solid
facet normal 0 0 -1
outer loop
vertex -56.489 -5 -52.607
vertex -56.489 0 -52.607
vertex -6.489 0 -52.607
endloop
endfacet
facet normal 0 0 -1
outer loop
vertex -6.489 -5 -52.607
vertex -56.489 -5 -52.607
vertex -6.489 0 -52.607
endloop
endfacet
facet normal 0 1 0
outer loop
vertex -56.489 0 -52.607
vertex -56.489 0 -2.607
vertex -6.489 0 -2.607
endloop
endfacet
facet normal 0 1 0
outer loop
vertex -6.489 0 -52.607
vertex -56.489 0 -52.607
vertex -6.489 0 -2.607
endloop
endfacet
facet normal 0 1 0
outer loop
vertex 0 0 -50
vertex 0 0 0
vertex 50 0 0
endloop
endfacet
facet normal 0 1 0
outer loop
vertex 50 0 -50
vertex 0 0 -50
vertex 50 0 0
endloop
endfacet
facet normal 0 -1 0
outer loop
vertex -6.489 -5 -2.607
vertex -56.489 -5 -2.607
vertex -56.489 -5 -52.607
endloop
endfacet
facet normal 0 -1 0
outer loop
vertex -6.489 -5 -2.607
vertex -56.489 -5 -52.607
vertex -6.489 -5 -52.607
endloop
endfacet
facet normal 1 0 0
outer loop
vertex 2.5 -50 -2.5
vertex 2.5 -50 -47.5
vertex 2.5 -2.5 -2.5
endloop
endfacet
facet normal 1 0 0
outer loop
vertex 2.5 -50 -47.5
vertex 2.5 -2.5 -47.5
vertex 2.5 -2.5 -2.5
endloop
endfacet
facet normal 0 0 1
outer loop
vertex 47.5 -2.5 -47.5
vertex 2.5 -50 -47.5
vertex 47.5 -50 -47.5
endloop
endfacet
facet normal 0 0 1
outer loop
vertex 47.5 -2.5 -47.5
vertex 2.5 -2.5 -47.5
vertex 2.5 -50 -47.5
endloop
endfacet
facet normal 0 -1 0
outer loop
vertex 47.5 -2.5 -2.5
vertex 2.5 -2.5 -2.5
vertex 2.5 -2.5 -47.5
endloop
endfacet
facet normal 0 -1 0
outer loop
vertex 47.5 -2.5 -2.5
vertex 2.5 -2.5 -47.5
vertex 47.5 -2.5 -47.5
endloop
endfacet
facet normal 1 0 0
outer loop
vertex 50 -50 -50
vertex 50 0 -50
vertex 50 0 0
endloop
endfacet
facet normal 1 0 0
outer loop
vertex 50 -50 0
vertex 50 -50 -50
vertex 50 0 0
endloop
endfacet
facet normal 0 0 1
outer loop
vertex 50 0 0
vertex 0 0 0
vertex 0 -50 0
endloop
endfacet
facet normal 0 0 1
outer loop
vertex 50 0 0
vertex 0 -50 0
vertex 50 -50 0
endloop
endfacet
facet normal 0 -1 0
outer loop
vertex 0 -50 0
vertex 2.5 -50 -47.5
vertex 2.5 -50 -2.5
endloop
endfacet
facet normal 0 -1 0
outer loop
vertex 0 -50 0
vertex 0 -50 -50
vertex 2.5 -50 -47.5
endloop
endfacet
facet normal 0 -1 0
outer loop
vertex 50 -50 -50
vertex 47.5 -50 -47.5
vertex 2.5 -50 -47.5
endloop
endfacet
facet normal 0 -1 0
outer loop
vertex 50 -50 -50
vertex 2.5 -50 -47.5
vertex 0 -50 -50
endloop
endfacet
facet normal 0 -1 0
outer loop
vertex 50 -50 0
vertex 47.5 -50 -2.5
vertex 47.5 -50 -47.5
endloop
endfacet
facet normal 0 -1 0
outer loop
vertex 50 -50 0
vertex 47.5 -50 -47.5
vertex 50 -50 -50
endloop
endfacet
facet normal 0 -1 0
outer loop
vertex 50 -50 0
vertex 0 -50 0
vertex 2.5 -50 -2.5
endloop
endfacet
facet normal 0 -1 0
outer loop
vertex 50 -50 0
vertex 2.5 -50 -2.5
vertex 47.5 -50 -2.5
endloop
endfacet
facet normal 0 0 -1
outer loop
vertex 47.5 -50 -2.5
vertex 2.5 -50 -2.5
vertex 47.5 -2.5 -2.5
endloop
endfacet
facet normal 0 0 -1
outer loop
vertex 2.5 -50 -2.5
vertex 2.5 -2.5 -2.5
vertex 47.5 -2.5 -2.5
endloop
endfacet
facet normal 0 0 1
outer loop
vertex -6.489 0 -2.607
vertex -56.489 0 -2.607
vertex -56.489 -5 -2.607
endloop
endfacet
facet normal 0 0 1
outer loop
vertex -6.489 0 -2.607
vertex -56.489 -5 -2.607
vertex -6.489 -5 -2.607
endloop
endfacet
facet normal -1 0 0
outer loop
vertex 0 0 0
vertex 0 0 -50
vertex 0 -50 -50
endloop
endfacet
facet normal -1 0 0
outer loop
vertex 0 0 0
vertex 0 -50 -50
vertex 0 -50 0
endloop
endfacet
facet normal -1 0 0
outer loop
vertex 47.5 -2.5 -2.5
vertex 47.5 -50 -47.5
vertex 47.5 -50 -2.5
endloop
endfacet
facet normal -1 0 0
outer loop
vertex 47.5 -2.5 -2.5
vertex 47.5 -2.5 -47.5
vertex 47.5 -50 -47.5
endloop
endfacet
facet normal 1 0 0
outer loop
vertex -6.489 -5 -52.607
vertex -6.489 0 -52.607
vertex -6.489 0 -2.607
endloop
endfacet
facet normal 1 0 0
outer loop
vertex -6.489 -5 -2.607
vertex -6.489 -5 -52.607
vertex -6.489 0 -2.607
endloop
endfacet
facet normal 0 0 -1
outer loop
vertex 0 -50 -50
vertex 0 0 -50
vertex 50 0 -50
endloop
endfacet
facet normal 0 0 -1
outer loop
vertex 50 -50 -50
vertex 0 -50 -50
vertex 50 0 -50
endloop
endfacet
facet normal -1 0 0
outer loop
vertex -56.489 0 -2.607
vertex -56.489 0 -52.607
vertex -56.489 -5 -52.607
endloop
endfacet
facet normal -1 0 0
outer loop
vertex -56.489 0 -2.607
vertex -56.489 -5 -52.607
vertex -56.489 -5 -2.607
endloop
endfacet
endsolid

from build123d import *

# Parameters (mm, degrees)
F0_W     = 50
F0_H     = 50
F1_DEPTH = 50
F2_DEPTH = 50
F3_T     = -2.5
F4_W     = 50
F4_H     = 50
F5_DEPTH = 5


with BuildPart() as f1:
    # F0 (on Front) → F1 (new body)
    with BuildSketch(Plane.XZ):
        with Locations((25, -25)):
            Rectangle(F0_W, F0_H)
    extrude(amount=F1_DEPTH)

    # F0 (on Front) → F2 (join)
    with BuildSketch(Plane.XZ):
        with Locations((25, -25)):
            Rectangle(F0_W, F0_H)
    extrude(amount=F2_DEPTH)

    # F3
    f3_openings = [f1.faces().sort_by_distance(p)[0] for p in [
        (25, -50, -25),
    ]]
    offset(amount=F3_T, openings=f3_openings)


with BuildPart() as f5:
    # F4 (on Front) → F5 (new body)
    with BuildSketch(Plane.XZ):
        with Locations((-31.488541, -27.606686)):
            Rectangle(F4_W, F4_H)
    extrude(amount=F5_DEPTH)


solid = Compound([f1.part, f5.part])
